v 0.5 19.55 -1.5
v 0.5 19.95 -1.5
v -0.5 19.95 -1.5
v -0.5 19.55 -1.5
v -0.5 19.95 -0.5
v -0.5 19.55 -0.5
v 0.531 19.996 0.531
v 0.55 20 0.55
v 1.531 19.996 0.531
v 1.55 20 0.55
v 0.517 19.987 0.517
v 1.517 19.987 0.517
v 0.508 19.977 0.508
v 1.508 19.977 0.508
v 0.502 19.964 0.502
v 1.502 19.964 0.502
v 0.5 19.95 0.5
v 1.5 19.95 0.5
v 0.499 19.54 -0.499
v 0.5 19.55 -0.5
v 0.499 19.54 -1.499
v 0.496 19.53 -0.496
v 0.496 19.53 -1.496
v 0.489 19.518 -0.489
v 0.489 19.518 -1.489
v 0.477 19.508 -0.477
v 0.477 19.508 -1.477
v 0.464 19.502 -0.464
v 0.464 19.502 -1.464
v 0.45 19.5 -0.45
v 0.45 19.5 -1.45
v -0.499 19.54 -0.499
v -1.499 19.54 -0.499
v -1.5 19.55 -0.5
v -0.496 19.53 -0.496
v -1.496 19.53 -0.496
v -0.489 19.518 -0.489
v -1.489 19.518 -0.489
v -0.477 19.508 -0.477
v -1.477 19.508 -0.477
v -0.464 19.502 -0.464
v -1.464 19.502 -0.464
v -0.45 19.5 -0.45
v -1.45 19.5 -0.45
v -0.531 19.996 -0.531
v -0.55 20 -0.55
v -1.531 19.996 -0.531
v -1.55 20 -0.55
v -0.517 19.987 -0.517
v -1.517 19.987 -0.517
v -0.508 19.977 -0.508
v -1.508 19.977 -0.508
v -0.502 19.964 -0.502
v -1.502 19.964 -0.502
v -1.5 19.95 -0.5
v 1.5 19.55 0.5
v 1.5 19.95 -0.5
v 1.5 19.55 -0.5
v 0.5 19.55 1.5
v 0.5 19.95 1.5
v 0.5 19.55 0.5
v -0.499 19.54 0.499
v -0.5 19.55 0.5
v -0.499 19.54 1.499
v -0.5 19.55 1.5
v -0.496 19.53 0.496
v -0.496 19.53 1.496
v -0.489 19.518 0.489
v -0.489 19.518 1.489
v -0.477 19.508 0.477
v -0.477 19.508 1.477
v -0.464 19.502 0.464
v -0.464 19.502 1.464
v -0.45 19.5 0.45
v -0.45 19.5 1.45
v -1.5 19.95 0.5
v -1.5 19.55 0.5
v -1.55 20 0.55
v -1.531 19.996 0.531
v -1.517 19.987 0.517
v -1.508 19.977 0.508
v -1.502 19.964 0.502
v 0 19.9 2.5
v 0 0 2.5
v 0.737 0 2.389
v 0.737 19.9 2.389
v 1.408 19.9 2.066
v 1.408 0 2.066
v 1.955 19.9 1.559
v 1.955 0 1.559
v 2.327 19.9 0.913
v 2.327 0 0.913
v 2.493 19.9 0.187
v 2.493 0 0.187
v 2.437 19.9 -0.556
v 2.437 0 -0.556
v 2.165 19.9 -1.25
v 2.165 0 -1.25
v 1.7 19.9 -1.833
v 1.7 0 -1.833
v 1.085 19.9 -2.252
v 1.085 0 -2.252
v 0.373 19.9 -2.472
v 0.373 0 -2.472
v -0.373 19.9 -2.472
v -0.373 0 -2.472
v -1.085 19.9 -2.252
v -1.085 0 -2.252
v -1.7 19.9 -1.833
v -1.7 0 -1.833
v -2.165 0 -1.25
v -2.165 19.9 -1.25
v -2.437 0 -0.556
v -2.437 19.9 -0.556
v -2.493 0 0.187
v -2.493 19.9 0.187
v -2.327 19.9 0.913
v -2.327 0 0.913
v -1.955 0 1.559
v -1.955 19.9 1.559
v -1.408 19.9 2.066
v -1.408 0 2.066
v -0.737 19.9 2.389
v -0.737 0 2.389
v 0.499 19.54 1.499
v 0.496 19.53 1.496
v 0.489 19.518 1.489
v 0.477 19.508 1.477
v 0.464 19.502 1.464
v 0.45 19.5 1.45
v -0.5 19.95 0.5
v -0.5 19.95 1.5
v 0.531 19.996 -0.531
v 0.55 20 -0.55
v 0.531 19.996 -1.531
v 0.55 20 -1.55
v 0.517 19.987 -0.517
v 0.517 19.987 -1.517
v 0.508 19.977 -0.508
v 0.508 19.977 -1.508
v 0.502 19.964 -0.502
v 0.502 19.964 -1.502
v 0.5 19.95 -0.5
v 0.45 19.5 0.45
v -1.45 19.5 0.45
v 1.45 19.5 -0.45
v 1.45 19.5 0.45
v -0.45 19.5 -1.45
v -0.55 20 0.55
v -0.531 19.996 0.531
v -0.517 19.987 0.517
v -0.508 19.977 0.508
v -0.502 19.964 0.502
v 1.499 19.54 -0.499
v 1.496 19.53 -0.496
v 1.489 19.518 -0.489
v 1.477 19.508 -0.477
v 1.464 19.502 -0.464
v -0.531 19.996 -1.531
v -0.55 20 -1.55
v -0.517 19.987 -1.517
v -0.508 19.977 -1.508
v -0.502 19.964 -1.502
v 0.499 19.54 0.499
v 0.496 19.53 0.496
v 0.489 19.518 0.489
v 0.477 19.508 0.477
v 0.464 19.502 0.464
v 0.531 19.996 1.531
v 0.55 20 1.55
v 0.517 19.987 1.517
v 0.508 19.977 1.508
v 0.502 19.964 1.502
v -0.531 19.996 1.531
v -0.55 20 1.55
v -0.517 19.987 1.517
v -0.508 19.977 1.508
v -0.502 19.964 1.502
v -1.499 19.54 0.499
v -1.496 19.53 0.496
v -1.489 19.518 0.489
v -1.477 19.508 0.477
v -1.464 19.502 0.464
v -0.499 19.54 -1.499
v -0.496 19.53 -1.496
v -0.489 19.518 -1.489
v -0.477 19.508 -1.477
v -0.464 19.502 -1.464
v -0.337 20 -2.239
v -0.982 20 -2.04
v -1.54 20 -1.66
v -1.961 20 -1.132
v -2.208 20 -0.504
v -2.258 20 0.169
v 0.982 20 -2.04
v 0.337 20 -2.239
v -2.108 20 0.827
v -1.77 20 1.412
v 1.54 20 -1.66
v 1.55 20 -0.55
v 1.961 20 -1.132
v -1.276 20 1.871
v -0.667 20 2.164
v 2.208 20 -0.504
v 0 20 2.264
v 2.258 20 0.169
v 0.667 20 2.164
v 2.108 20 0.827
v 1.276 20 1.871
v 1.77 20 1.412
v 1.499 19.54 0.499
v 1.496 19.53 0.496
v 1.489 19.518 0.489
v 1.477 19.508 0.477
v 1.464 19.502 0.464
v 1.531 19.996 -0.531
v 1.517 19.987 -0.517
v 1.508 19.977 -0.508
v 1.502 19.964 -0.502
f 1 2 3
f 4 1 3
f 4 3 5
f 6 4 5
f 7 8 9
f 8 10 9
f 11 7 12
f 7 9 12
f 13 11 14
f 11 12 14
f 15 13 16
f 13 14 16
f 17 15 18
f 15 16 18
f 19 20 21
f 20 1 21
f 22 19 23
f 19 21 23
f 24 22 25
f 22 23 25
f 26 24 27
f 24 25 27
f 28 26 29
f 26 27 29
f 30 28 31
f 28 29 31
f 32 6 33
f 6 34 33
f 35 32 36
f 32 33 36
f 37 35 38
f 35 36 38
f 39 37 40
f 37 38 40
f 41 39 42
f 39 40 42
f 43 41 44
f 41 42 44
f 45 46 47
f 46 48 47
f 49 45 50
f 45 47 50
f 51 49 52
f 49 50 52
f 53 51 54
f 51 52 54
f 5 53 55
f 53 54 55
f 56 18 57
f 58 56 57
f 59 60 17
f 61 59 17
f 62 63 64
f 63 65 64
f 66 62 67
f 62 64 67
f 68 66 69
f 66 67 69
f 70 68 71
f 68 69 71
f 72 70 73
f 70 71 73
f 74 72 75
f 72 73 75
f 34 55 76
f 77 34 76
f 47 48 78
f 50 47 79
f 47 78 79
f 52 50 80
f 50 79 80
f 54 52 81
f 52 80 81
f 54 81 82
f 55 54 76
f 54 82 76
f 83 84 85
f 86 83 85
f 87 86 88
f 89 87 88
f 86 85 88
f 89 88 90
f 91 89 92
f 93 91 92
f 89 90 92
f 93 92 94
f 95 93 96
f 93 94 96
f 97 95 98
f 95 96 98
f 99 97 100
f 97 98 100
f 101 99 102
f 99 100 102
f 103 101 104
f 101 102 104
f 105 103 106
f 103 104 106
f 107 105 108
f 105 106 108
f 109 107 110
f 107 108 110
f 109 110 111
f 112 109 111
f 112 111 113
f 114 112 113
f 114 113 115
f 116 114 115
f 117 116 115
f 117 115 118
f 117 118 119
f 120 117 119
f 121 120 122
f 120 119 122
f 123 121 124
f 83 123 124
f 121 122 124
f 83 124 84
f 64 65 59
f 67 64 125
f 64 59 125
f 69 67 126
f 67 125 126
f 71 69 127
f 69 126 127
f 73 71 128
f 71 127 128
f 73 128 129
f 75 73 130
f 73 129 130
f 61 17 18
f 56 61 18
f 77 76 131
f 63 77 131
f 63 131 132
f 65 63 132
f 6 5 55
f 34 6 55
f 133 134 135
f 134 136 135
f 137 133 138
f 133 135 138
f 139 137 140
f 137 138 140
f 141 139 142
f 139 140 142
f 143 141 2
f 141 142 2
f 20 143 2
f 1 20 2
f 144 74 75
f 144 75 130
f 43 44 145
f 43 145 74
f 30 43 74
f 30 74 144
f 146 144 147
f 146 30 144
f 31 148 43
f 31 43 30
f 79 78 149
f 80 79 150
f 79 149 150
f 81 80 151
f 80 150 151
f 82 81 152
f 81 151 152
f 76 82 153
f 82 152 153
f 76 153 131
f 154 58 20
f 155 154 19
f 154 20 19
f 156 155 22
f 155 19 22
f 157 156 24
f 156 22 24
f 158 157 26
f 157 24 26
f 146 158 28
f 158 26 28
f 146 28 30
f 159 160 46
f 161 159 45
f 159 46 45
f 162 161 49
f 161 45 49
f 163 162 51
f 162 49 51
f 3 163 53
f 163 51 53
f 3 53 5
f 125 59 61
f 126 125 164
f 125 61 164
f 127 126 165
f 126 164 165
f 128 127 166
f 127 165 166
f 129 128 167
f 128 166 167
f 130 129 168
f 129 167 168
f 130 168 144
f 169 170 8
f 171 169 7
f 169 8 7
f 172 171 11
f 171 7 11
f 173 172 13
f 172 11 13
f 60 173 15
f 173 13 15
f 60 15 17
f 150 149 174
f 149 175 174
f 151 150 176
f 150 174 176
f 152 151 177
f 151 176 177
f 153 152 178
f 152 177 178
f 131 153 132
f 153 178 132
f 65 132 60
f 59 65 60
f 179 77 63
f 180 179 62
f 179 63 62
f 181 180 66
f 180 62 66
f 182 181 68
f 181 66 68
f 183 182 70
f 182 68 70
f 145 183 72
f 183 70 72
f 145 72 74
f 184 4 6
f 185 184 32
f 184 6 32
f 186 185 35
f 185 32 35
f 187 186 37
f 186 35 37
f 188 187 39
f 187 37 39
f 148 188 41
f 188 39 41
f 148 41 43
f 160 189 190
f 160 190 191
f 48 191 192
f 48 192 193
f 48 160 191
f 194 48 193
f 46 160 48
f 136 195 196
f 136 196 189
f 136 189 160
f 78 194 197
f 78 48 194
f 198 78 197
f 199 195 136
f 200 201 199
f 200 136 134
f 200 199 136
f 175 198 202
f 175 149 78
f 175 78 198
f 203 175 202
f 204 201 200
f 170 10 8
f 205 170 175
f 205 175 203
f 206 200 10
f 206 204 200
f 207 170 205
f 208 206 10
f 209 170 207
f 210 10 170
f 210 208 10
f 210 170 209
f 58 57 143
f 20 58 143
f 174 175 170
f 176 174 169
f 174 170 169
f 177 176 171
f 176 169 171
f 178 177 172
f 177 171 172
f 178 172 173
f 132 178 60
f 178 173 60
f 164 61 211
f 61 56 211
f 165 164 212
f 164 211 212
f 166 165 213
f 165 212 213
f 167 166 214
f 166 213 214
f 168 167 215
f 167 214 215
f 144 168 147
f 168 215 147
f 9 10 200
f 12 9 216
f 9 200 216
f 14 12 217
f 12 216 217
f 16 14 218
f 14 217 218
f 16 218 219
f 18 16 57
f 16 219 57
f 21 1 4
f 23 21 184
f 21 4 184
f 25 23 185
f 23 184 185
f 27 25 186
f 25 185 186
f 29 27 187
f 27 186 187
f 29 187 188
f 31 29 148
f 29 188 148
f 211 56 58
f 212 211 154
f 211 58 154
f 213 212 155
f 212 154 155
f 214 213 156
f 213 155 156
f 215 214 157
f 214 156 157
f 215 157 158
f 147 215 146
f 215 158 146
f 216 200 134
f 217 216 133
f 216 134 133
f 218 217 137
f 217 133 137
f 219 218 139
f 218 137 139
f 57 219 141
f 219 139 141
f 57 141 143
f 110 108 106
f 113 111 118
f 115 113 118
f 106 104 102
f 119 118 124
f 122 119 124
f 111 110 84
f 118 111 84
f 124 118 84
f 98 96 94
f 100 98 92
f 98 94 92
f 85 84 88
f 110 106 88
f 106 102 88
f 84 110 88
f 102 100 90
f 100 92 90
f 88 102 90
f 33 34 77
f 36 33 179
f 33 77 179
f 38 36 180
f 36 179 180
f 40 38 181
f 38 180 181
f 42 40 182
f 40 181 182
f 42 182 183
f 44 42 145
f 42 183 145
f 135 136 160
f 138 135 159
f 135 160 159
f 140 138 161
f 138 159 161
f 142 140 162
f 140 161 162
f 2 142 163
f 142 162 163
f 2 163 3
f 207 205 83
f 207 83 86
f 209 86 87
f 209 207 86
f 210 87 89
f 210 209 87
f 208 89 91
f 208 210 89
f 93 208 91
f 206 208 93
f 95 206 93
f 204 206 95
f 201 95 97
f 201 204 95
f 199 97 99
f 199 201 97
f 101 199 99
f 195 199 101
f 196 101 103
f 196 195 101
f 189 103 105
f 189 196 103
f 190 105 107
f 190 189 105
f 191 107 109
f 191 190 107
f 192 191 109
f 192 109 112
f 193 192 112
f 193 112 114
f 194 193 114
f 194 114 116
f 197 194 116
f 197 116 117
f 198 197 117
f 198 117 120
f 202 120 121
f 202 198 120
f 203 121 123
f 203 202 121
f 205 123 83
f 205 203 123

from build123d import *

# Parameters (mm, degrees)
SKETCH1_R           = 2.5
BOSS_EXTRUDE1_DEPTH = 20
CHAMFER1_SIZE       = 0.1
CHAMFER1_SIZE2      = 0.235585237
CUT_EXTRUDE1_DEPTH  = 0.5
FILLET1_R           = 0.05


with BuildPart() as part:
    # Sketch1 → Boss-Extrude1 (new body)
    with BuildSketch(Plane(origin=(0, 0, 0), x_dir=(1, 0, 0), z_dir=(0, 1, 0))):
        with Locations(Location((0, 0, 0), (0, 0, 270))):
            Circle(SKETCH1_R)
    extrude(amount=BOSS_EXTRUDE1_DEPTH)

    # Chamfer1
    chamfer1_edges = [part.edges().sort_by_distance(p)[0] for p in [
        (0, 20, -2.5),
    ]]
    chamfer1_side = [part.faces().sort_by_distance(p)[0] for p in [
        (0, 10, -2.5),
    ]]
    chamfer(chamfer1_edges, length=CHAMFER1_SIZE, length2=CHAMFER1_SIZE2, reference=chamfer1_side[0])

    # Sketch2 → Cut-Extrude1 (cut)
    with BuildSketch(Plane(origin=(0, 20, 0), x_dir=(1, 0, 0), z_dir=(0, 1, 0))):
        Polygon((0.5, 0.5), (0.5, 1.5), (-0.5, 1.5), (-0.5, 0.5), (-1.5, 0.5), (-1.5, -0.5), (-0.5, -0.5), (-0.5, -1.5), (0.5, -1.5), (0.5, -0.5), (1.5, -0.5), (1.5, 0.5), align=None)
    extrude(amount=-CUT_EXTRUDE1_DEPTH, mode=Mode.SUBTRACT)

    # Fillet1
    fillet1_edges = [part.edges().sort_by_distance(p)[0] for p in [
        (-0.5, 19.5, -1),
        (0, 19.5, -1.5),
        (0.5, 19.5, -1),
        (1, 19.5, -0.5),
        (1.5, 19.5, 0),
        (1, 19.5, 0.5),
        (0.5, 19.5, 1),
        (0, 19.5, 1.5),
        (-0.5, 19.5, 1),
        (-1, 19.5, 0.5),
        (-1.5, 19.5, 0),
        (-1, 19.5, -0.5),
        (-0.5, 20, -1),
        (-1, 20, -0.5),
        (-1.5, 20, 0),
        (-1, 20, 0.5),
        (-0.5, 20, 1),
        (0, 20, 1.5),
        (0.5, 20, 1),
        (1, 20, 0.5),
        (1.5, 20, 0),
        (1, 20, -0.5),
        (0.5, 20, -1),
        (0, 20, -1.5),
    ]]
    fillet(fillet1_edges, radius=FILLET1_R)


solid = part.part
